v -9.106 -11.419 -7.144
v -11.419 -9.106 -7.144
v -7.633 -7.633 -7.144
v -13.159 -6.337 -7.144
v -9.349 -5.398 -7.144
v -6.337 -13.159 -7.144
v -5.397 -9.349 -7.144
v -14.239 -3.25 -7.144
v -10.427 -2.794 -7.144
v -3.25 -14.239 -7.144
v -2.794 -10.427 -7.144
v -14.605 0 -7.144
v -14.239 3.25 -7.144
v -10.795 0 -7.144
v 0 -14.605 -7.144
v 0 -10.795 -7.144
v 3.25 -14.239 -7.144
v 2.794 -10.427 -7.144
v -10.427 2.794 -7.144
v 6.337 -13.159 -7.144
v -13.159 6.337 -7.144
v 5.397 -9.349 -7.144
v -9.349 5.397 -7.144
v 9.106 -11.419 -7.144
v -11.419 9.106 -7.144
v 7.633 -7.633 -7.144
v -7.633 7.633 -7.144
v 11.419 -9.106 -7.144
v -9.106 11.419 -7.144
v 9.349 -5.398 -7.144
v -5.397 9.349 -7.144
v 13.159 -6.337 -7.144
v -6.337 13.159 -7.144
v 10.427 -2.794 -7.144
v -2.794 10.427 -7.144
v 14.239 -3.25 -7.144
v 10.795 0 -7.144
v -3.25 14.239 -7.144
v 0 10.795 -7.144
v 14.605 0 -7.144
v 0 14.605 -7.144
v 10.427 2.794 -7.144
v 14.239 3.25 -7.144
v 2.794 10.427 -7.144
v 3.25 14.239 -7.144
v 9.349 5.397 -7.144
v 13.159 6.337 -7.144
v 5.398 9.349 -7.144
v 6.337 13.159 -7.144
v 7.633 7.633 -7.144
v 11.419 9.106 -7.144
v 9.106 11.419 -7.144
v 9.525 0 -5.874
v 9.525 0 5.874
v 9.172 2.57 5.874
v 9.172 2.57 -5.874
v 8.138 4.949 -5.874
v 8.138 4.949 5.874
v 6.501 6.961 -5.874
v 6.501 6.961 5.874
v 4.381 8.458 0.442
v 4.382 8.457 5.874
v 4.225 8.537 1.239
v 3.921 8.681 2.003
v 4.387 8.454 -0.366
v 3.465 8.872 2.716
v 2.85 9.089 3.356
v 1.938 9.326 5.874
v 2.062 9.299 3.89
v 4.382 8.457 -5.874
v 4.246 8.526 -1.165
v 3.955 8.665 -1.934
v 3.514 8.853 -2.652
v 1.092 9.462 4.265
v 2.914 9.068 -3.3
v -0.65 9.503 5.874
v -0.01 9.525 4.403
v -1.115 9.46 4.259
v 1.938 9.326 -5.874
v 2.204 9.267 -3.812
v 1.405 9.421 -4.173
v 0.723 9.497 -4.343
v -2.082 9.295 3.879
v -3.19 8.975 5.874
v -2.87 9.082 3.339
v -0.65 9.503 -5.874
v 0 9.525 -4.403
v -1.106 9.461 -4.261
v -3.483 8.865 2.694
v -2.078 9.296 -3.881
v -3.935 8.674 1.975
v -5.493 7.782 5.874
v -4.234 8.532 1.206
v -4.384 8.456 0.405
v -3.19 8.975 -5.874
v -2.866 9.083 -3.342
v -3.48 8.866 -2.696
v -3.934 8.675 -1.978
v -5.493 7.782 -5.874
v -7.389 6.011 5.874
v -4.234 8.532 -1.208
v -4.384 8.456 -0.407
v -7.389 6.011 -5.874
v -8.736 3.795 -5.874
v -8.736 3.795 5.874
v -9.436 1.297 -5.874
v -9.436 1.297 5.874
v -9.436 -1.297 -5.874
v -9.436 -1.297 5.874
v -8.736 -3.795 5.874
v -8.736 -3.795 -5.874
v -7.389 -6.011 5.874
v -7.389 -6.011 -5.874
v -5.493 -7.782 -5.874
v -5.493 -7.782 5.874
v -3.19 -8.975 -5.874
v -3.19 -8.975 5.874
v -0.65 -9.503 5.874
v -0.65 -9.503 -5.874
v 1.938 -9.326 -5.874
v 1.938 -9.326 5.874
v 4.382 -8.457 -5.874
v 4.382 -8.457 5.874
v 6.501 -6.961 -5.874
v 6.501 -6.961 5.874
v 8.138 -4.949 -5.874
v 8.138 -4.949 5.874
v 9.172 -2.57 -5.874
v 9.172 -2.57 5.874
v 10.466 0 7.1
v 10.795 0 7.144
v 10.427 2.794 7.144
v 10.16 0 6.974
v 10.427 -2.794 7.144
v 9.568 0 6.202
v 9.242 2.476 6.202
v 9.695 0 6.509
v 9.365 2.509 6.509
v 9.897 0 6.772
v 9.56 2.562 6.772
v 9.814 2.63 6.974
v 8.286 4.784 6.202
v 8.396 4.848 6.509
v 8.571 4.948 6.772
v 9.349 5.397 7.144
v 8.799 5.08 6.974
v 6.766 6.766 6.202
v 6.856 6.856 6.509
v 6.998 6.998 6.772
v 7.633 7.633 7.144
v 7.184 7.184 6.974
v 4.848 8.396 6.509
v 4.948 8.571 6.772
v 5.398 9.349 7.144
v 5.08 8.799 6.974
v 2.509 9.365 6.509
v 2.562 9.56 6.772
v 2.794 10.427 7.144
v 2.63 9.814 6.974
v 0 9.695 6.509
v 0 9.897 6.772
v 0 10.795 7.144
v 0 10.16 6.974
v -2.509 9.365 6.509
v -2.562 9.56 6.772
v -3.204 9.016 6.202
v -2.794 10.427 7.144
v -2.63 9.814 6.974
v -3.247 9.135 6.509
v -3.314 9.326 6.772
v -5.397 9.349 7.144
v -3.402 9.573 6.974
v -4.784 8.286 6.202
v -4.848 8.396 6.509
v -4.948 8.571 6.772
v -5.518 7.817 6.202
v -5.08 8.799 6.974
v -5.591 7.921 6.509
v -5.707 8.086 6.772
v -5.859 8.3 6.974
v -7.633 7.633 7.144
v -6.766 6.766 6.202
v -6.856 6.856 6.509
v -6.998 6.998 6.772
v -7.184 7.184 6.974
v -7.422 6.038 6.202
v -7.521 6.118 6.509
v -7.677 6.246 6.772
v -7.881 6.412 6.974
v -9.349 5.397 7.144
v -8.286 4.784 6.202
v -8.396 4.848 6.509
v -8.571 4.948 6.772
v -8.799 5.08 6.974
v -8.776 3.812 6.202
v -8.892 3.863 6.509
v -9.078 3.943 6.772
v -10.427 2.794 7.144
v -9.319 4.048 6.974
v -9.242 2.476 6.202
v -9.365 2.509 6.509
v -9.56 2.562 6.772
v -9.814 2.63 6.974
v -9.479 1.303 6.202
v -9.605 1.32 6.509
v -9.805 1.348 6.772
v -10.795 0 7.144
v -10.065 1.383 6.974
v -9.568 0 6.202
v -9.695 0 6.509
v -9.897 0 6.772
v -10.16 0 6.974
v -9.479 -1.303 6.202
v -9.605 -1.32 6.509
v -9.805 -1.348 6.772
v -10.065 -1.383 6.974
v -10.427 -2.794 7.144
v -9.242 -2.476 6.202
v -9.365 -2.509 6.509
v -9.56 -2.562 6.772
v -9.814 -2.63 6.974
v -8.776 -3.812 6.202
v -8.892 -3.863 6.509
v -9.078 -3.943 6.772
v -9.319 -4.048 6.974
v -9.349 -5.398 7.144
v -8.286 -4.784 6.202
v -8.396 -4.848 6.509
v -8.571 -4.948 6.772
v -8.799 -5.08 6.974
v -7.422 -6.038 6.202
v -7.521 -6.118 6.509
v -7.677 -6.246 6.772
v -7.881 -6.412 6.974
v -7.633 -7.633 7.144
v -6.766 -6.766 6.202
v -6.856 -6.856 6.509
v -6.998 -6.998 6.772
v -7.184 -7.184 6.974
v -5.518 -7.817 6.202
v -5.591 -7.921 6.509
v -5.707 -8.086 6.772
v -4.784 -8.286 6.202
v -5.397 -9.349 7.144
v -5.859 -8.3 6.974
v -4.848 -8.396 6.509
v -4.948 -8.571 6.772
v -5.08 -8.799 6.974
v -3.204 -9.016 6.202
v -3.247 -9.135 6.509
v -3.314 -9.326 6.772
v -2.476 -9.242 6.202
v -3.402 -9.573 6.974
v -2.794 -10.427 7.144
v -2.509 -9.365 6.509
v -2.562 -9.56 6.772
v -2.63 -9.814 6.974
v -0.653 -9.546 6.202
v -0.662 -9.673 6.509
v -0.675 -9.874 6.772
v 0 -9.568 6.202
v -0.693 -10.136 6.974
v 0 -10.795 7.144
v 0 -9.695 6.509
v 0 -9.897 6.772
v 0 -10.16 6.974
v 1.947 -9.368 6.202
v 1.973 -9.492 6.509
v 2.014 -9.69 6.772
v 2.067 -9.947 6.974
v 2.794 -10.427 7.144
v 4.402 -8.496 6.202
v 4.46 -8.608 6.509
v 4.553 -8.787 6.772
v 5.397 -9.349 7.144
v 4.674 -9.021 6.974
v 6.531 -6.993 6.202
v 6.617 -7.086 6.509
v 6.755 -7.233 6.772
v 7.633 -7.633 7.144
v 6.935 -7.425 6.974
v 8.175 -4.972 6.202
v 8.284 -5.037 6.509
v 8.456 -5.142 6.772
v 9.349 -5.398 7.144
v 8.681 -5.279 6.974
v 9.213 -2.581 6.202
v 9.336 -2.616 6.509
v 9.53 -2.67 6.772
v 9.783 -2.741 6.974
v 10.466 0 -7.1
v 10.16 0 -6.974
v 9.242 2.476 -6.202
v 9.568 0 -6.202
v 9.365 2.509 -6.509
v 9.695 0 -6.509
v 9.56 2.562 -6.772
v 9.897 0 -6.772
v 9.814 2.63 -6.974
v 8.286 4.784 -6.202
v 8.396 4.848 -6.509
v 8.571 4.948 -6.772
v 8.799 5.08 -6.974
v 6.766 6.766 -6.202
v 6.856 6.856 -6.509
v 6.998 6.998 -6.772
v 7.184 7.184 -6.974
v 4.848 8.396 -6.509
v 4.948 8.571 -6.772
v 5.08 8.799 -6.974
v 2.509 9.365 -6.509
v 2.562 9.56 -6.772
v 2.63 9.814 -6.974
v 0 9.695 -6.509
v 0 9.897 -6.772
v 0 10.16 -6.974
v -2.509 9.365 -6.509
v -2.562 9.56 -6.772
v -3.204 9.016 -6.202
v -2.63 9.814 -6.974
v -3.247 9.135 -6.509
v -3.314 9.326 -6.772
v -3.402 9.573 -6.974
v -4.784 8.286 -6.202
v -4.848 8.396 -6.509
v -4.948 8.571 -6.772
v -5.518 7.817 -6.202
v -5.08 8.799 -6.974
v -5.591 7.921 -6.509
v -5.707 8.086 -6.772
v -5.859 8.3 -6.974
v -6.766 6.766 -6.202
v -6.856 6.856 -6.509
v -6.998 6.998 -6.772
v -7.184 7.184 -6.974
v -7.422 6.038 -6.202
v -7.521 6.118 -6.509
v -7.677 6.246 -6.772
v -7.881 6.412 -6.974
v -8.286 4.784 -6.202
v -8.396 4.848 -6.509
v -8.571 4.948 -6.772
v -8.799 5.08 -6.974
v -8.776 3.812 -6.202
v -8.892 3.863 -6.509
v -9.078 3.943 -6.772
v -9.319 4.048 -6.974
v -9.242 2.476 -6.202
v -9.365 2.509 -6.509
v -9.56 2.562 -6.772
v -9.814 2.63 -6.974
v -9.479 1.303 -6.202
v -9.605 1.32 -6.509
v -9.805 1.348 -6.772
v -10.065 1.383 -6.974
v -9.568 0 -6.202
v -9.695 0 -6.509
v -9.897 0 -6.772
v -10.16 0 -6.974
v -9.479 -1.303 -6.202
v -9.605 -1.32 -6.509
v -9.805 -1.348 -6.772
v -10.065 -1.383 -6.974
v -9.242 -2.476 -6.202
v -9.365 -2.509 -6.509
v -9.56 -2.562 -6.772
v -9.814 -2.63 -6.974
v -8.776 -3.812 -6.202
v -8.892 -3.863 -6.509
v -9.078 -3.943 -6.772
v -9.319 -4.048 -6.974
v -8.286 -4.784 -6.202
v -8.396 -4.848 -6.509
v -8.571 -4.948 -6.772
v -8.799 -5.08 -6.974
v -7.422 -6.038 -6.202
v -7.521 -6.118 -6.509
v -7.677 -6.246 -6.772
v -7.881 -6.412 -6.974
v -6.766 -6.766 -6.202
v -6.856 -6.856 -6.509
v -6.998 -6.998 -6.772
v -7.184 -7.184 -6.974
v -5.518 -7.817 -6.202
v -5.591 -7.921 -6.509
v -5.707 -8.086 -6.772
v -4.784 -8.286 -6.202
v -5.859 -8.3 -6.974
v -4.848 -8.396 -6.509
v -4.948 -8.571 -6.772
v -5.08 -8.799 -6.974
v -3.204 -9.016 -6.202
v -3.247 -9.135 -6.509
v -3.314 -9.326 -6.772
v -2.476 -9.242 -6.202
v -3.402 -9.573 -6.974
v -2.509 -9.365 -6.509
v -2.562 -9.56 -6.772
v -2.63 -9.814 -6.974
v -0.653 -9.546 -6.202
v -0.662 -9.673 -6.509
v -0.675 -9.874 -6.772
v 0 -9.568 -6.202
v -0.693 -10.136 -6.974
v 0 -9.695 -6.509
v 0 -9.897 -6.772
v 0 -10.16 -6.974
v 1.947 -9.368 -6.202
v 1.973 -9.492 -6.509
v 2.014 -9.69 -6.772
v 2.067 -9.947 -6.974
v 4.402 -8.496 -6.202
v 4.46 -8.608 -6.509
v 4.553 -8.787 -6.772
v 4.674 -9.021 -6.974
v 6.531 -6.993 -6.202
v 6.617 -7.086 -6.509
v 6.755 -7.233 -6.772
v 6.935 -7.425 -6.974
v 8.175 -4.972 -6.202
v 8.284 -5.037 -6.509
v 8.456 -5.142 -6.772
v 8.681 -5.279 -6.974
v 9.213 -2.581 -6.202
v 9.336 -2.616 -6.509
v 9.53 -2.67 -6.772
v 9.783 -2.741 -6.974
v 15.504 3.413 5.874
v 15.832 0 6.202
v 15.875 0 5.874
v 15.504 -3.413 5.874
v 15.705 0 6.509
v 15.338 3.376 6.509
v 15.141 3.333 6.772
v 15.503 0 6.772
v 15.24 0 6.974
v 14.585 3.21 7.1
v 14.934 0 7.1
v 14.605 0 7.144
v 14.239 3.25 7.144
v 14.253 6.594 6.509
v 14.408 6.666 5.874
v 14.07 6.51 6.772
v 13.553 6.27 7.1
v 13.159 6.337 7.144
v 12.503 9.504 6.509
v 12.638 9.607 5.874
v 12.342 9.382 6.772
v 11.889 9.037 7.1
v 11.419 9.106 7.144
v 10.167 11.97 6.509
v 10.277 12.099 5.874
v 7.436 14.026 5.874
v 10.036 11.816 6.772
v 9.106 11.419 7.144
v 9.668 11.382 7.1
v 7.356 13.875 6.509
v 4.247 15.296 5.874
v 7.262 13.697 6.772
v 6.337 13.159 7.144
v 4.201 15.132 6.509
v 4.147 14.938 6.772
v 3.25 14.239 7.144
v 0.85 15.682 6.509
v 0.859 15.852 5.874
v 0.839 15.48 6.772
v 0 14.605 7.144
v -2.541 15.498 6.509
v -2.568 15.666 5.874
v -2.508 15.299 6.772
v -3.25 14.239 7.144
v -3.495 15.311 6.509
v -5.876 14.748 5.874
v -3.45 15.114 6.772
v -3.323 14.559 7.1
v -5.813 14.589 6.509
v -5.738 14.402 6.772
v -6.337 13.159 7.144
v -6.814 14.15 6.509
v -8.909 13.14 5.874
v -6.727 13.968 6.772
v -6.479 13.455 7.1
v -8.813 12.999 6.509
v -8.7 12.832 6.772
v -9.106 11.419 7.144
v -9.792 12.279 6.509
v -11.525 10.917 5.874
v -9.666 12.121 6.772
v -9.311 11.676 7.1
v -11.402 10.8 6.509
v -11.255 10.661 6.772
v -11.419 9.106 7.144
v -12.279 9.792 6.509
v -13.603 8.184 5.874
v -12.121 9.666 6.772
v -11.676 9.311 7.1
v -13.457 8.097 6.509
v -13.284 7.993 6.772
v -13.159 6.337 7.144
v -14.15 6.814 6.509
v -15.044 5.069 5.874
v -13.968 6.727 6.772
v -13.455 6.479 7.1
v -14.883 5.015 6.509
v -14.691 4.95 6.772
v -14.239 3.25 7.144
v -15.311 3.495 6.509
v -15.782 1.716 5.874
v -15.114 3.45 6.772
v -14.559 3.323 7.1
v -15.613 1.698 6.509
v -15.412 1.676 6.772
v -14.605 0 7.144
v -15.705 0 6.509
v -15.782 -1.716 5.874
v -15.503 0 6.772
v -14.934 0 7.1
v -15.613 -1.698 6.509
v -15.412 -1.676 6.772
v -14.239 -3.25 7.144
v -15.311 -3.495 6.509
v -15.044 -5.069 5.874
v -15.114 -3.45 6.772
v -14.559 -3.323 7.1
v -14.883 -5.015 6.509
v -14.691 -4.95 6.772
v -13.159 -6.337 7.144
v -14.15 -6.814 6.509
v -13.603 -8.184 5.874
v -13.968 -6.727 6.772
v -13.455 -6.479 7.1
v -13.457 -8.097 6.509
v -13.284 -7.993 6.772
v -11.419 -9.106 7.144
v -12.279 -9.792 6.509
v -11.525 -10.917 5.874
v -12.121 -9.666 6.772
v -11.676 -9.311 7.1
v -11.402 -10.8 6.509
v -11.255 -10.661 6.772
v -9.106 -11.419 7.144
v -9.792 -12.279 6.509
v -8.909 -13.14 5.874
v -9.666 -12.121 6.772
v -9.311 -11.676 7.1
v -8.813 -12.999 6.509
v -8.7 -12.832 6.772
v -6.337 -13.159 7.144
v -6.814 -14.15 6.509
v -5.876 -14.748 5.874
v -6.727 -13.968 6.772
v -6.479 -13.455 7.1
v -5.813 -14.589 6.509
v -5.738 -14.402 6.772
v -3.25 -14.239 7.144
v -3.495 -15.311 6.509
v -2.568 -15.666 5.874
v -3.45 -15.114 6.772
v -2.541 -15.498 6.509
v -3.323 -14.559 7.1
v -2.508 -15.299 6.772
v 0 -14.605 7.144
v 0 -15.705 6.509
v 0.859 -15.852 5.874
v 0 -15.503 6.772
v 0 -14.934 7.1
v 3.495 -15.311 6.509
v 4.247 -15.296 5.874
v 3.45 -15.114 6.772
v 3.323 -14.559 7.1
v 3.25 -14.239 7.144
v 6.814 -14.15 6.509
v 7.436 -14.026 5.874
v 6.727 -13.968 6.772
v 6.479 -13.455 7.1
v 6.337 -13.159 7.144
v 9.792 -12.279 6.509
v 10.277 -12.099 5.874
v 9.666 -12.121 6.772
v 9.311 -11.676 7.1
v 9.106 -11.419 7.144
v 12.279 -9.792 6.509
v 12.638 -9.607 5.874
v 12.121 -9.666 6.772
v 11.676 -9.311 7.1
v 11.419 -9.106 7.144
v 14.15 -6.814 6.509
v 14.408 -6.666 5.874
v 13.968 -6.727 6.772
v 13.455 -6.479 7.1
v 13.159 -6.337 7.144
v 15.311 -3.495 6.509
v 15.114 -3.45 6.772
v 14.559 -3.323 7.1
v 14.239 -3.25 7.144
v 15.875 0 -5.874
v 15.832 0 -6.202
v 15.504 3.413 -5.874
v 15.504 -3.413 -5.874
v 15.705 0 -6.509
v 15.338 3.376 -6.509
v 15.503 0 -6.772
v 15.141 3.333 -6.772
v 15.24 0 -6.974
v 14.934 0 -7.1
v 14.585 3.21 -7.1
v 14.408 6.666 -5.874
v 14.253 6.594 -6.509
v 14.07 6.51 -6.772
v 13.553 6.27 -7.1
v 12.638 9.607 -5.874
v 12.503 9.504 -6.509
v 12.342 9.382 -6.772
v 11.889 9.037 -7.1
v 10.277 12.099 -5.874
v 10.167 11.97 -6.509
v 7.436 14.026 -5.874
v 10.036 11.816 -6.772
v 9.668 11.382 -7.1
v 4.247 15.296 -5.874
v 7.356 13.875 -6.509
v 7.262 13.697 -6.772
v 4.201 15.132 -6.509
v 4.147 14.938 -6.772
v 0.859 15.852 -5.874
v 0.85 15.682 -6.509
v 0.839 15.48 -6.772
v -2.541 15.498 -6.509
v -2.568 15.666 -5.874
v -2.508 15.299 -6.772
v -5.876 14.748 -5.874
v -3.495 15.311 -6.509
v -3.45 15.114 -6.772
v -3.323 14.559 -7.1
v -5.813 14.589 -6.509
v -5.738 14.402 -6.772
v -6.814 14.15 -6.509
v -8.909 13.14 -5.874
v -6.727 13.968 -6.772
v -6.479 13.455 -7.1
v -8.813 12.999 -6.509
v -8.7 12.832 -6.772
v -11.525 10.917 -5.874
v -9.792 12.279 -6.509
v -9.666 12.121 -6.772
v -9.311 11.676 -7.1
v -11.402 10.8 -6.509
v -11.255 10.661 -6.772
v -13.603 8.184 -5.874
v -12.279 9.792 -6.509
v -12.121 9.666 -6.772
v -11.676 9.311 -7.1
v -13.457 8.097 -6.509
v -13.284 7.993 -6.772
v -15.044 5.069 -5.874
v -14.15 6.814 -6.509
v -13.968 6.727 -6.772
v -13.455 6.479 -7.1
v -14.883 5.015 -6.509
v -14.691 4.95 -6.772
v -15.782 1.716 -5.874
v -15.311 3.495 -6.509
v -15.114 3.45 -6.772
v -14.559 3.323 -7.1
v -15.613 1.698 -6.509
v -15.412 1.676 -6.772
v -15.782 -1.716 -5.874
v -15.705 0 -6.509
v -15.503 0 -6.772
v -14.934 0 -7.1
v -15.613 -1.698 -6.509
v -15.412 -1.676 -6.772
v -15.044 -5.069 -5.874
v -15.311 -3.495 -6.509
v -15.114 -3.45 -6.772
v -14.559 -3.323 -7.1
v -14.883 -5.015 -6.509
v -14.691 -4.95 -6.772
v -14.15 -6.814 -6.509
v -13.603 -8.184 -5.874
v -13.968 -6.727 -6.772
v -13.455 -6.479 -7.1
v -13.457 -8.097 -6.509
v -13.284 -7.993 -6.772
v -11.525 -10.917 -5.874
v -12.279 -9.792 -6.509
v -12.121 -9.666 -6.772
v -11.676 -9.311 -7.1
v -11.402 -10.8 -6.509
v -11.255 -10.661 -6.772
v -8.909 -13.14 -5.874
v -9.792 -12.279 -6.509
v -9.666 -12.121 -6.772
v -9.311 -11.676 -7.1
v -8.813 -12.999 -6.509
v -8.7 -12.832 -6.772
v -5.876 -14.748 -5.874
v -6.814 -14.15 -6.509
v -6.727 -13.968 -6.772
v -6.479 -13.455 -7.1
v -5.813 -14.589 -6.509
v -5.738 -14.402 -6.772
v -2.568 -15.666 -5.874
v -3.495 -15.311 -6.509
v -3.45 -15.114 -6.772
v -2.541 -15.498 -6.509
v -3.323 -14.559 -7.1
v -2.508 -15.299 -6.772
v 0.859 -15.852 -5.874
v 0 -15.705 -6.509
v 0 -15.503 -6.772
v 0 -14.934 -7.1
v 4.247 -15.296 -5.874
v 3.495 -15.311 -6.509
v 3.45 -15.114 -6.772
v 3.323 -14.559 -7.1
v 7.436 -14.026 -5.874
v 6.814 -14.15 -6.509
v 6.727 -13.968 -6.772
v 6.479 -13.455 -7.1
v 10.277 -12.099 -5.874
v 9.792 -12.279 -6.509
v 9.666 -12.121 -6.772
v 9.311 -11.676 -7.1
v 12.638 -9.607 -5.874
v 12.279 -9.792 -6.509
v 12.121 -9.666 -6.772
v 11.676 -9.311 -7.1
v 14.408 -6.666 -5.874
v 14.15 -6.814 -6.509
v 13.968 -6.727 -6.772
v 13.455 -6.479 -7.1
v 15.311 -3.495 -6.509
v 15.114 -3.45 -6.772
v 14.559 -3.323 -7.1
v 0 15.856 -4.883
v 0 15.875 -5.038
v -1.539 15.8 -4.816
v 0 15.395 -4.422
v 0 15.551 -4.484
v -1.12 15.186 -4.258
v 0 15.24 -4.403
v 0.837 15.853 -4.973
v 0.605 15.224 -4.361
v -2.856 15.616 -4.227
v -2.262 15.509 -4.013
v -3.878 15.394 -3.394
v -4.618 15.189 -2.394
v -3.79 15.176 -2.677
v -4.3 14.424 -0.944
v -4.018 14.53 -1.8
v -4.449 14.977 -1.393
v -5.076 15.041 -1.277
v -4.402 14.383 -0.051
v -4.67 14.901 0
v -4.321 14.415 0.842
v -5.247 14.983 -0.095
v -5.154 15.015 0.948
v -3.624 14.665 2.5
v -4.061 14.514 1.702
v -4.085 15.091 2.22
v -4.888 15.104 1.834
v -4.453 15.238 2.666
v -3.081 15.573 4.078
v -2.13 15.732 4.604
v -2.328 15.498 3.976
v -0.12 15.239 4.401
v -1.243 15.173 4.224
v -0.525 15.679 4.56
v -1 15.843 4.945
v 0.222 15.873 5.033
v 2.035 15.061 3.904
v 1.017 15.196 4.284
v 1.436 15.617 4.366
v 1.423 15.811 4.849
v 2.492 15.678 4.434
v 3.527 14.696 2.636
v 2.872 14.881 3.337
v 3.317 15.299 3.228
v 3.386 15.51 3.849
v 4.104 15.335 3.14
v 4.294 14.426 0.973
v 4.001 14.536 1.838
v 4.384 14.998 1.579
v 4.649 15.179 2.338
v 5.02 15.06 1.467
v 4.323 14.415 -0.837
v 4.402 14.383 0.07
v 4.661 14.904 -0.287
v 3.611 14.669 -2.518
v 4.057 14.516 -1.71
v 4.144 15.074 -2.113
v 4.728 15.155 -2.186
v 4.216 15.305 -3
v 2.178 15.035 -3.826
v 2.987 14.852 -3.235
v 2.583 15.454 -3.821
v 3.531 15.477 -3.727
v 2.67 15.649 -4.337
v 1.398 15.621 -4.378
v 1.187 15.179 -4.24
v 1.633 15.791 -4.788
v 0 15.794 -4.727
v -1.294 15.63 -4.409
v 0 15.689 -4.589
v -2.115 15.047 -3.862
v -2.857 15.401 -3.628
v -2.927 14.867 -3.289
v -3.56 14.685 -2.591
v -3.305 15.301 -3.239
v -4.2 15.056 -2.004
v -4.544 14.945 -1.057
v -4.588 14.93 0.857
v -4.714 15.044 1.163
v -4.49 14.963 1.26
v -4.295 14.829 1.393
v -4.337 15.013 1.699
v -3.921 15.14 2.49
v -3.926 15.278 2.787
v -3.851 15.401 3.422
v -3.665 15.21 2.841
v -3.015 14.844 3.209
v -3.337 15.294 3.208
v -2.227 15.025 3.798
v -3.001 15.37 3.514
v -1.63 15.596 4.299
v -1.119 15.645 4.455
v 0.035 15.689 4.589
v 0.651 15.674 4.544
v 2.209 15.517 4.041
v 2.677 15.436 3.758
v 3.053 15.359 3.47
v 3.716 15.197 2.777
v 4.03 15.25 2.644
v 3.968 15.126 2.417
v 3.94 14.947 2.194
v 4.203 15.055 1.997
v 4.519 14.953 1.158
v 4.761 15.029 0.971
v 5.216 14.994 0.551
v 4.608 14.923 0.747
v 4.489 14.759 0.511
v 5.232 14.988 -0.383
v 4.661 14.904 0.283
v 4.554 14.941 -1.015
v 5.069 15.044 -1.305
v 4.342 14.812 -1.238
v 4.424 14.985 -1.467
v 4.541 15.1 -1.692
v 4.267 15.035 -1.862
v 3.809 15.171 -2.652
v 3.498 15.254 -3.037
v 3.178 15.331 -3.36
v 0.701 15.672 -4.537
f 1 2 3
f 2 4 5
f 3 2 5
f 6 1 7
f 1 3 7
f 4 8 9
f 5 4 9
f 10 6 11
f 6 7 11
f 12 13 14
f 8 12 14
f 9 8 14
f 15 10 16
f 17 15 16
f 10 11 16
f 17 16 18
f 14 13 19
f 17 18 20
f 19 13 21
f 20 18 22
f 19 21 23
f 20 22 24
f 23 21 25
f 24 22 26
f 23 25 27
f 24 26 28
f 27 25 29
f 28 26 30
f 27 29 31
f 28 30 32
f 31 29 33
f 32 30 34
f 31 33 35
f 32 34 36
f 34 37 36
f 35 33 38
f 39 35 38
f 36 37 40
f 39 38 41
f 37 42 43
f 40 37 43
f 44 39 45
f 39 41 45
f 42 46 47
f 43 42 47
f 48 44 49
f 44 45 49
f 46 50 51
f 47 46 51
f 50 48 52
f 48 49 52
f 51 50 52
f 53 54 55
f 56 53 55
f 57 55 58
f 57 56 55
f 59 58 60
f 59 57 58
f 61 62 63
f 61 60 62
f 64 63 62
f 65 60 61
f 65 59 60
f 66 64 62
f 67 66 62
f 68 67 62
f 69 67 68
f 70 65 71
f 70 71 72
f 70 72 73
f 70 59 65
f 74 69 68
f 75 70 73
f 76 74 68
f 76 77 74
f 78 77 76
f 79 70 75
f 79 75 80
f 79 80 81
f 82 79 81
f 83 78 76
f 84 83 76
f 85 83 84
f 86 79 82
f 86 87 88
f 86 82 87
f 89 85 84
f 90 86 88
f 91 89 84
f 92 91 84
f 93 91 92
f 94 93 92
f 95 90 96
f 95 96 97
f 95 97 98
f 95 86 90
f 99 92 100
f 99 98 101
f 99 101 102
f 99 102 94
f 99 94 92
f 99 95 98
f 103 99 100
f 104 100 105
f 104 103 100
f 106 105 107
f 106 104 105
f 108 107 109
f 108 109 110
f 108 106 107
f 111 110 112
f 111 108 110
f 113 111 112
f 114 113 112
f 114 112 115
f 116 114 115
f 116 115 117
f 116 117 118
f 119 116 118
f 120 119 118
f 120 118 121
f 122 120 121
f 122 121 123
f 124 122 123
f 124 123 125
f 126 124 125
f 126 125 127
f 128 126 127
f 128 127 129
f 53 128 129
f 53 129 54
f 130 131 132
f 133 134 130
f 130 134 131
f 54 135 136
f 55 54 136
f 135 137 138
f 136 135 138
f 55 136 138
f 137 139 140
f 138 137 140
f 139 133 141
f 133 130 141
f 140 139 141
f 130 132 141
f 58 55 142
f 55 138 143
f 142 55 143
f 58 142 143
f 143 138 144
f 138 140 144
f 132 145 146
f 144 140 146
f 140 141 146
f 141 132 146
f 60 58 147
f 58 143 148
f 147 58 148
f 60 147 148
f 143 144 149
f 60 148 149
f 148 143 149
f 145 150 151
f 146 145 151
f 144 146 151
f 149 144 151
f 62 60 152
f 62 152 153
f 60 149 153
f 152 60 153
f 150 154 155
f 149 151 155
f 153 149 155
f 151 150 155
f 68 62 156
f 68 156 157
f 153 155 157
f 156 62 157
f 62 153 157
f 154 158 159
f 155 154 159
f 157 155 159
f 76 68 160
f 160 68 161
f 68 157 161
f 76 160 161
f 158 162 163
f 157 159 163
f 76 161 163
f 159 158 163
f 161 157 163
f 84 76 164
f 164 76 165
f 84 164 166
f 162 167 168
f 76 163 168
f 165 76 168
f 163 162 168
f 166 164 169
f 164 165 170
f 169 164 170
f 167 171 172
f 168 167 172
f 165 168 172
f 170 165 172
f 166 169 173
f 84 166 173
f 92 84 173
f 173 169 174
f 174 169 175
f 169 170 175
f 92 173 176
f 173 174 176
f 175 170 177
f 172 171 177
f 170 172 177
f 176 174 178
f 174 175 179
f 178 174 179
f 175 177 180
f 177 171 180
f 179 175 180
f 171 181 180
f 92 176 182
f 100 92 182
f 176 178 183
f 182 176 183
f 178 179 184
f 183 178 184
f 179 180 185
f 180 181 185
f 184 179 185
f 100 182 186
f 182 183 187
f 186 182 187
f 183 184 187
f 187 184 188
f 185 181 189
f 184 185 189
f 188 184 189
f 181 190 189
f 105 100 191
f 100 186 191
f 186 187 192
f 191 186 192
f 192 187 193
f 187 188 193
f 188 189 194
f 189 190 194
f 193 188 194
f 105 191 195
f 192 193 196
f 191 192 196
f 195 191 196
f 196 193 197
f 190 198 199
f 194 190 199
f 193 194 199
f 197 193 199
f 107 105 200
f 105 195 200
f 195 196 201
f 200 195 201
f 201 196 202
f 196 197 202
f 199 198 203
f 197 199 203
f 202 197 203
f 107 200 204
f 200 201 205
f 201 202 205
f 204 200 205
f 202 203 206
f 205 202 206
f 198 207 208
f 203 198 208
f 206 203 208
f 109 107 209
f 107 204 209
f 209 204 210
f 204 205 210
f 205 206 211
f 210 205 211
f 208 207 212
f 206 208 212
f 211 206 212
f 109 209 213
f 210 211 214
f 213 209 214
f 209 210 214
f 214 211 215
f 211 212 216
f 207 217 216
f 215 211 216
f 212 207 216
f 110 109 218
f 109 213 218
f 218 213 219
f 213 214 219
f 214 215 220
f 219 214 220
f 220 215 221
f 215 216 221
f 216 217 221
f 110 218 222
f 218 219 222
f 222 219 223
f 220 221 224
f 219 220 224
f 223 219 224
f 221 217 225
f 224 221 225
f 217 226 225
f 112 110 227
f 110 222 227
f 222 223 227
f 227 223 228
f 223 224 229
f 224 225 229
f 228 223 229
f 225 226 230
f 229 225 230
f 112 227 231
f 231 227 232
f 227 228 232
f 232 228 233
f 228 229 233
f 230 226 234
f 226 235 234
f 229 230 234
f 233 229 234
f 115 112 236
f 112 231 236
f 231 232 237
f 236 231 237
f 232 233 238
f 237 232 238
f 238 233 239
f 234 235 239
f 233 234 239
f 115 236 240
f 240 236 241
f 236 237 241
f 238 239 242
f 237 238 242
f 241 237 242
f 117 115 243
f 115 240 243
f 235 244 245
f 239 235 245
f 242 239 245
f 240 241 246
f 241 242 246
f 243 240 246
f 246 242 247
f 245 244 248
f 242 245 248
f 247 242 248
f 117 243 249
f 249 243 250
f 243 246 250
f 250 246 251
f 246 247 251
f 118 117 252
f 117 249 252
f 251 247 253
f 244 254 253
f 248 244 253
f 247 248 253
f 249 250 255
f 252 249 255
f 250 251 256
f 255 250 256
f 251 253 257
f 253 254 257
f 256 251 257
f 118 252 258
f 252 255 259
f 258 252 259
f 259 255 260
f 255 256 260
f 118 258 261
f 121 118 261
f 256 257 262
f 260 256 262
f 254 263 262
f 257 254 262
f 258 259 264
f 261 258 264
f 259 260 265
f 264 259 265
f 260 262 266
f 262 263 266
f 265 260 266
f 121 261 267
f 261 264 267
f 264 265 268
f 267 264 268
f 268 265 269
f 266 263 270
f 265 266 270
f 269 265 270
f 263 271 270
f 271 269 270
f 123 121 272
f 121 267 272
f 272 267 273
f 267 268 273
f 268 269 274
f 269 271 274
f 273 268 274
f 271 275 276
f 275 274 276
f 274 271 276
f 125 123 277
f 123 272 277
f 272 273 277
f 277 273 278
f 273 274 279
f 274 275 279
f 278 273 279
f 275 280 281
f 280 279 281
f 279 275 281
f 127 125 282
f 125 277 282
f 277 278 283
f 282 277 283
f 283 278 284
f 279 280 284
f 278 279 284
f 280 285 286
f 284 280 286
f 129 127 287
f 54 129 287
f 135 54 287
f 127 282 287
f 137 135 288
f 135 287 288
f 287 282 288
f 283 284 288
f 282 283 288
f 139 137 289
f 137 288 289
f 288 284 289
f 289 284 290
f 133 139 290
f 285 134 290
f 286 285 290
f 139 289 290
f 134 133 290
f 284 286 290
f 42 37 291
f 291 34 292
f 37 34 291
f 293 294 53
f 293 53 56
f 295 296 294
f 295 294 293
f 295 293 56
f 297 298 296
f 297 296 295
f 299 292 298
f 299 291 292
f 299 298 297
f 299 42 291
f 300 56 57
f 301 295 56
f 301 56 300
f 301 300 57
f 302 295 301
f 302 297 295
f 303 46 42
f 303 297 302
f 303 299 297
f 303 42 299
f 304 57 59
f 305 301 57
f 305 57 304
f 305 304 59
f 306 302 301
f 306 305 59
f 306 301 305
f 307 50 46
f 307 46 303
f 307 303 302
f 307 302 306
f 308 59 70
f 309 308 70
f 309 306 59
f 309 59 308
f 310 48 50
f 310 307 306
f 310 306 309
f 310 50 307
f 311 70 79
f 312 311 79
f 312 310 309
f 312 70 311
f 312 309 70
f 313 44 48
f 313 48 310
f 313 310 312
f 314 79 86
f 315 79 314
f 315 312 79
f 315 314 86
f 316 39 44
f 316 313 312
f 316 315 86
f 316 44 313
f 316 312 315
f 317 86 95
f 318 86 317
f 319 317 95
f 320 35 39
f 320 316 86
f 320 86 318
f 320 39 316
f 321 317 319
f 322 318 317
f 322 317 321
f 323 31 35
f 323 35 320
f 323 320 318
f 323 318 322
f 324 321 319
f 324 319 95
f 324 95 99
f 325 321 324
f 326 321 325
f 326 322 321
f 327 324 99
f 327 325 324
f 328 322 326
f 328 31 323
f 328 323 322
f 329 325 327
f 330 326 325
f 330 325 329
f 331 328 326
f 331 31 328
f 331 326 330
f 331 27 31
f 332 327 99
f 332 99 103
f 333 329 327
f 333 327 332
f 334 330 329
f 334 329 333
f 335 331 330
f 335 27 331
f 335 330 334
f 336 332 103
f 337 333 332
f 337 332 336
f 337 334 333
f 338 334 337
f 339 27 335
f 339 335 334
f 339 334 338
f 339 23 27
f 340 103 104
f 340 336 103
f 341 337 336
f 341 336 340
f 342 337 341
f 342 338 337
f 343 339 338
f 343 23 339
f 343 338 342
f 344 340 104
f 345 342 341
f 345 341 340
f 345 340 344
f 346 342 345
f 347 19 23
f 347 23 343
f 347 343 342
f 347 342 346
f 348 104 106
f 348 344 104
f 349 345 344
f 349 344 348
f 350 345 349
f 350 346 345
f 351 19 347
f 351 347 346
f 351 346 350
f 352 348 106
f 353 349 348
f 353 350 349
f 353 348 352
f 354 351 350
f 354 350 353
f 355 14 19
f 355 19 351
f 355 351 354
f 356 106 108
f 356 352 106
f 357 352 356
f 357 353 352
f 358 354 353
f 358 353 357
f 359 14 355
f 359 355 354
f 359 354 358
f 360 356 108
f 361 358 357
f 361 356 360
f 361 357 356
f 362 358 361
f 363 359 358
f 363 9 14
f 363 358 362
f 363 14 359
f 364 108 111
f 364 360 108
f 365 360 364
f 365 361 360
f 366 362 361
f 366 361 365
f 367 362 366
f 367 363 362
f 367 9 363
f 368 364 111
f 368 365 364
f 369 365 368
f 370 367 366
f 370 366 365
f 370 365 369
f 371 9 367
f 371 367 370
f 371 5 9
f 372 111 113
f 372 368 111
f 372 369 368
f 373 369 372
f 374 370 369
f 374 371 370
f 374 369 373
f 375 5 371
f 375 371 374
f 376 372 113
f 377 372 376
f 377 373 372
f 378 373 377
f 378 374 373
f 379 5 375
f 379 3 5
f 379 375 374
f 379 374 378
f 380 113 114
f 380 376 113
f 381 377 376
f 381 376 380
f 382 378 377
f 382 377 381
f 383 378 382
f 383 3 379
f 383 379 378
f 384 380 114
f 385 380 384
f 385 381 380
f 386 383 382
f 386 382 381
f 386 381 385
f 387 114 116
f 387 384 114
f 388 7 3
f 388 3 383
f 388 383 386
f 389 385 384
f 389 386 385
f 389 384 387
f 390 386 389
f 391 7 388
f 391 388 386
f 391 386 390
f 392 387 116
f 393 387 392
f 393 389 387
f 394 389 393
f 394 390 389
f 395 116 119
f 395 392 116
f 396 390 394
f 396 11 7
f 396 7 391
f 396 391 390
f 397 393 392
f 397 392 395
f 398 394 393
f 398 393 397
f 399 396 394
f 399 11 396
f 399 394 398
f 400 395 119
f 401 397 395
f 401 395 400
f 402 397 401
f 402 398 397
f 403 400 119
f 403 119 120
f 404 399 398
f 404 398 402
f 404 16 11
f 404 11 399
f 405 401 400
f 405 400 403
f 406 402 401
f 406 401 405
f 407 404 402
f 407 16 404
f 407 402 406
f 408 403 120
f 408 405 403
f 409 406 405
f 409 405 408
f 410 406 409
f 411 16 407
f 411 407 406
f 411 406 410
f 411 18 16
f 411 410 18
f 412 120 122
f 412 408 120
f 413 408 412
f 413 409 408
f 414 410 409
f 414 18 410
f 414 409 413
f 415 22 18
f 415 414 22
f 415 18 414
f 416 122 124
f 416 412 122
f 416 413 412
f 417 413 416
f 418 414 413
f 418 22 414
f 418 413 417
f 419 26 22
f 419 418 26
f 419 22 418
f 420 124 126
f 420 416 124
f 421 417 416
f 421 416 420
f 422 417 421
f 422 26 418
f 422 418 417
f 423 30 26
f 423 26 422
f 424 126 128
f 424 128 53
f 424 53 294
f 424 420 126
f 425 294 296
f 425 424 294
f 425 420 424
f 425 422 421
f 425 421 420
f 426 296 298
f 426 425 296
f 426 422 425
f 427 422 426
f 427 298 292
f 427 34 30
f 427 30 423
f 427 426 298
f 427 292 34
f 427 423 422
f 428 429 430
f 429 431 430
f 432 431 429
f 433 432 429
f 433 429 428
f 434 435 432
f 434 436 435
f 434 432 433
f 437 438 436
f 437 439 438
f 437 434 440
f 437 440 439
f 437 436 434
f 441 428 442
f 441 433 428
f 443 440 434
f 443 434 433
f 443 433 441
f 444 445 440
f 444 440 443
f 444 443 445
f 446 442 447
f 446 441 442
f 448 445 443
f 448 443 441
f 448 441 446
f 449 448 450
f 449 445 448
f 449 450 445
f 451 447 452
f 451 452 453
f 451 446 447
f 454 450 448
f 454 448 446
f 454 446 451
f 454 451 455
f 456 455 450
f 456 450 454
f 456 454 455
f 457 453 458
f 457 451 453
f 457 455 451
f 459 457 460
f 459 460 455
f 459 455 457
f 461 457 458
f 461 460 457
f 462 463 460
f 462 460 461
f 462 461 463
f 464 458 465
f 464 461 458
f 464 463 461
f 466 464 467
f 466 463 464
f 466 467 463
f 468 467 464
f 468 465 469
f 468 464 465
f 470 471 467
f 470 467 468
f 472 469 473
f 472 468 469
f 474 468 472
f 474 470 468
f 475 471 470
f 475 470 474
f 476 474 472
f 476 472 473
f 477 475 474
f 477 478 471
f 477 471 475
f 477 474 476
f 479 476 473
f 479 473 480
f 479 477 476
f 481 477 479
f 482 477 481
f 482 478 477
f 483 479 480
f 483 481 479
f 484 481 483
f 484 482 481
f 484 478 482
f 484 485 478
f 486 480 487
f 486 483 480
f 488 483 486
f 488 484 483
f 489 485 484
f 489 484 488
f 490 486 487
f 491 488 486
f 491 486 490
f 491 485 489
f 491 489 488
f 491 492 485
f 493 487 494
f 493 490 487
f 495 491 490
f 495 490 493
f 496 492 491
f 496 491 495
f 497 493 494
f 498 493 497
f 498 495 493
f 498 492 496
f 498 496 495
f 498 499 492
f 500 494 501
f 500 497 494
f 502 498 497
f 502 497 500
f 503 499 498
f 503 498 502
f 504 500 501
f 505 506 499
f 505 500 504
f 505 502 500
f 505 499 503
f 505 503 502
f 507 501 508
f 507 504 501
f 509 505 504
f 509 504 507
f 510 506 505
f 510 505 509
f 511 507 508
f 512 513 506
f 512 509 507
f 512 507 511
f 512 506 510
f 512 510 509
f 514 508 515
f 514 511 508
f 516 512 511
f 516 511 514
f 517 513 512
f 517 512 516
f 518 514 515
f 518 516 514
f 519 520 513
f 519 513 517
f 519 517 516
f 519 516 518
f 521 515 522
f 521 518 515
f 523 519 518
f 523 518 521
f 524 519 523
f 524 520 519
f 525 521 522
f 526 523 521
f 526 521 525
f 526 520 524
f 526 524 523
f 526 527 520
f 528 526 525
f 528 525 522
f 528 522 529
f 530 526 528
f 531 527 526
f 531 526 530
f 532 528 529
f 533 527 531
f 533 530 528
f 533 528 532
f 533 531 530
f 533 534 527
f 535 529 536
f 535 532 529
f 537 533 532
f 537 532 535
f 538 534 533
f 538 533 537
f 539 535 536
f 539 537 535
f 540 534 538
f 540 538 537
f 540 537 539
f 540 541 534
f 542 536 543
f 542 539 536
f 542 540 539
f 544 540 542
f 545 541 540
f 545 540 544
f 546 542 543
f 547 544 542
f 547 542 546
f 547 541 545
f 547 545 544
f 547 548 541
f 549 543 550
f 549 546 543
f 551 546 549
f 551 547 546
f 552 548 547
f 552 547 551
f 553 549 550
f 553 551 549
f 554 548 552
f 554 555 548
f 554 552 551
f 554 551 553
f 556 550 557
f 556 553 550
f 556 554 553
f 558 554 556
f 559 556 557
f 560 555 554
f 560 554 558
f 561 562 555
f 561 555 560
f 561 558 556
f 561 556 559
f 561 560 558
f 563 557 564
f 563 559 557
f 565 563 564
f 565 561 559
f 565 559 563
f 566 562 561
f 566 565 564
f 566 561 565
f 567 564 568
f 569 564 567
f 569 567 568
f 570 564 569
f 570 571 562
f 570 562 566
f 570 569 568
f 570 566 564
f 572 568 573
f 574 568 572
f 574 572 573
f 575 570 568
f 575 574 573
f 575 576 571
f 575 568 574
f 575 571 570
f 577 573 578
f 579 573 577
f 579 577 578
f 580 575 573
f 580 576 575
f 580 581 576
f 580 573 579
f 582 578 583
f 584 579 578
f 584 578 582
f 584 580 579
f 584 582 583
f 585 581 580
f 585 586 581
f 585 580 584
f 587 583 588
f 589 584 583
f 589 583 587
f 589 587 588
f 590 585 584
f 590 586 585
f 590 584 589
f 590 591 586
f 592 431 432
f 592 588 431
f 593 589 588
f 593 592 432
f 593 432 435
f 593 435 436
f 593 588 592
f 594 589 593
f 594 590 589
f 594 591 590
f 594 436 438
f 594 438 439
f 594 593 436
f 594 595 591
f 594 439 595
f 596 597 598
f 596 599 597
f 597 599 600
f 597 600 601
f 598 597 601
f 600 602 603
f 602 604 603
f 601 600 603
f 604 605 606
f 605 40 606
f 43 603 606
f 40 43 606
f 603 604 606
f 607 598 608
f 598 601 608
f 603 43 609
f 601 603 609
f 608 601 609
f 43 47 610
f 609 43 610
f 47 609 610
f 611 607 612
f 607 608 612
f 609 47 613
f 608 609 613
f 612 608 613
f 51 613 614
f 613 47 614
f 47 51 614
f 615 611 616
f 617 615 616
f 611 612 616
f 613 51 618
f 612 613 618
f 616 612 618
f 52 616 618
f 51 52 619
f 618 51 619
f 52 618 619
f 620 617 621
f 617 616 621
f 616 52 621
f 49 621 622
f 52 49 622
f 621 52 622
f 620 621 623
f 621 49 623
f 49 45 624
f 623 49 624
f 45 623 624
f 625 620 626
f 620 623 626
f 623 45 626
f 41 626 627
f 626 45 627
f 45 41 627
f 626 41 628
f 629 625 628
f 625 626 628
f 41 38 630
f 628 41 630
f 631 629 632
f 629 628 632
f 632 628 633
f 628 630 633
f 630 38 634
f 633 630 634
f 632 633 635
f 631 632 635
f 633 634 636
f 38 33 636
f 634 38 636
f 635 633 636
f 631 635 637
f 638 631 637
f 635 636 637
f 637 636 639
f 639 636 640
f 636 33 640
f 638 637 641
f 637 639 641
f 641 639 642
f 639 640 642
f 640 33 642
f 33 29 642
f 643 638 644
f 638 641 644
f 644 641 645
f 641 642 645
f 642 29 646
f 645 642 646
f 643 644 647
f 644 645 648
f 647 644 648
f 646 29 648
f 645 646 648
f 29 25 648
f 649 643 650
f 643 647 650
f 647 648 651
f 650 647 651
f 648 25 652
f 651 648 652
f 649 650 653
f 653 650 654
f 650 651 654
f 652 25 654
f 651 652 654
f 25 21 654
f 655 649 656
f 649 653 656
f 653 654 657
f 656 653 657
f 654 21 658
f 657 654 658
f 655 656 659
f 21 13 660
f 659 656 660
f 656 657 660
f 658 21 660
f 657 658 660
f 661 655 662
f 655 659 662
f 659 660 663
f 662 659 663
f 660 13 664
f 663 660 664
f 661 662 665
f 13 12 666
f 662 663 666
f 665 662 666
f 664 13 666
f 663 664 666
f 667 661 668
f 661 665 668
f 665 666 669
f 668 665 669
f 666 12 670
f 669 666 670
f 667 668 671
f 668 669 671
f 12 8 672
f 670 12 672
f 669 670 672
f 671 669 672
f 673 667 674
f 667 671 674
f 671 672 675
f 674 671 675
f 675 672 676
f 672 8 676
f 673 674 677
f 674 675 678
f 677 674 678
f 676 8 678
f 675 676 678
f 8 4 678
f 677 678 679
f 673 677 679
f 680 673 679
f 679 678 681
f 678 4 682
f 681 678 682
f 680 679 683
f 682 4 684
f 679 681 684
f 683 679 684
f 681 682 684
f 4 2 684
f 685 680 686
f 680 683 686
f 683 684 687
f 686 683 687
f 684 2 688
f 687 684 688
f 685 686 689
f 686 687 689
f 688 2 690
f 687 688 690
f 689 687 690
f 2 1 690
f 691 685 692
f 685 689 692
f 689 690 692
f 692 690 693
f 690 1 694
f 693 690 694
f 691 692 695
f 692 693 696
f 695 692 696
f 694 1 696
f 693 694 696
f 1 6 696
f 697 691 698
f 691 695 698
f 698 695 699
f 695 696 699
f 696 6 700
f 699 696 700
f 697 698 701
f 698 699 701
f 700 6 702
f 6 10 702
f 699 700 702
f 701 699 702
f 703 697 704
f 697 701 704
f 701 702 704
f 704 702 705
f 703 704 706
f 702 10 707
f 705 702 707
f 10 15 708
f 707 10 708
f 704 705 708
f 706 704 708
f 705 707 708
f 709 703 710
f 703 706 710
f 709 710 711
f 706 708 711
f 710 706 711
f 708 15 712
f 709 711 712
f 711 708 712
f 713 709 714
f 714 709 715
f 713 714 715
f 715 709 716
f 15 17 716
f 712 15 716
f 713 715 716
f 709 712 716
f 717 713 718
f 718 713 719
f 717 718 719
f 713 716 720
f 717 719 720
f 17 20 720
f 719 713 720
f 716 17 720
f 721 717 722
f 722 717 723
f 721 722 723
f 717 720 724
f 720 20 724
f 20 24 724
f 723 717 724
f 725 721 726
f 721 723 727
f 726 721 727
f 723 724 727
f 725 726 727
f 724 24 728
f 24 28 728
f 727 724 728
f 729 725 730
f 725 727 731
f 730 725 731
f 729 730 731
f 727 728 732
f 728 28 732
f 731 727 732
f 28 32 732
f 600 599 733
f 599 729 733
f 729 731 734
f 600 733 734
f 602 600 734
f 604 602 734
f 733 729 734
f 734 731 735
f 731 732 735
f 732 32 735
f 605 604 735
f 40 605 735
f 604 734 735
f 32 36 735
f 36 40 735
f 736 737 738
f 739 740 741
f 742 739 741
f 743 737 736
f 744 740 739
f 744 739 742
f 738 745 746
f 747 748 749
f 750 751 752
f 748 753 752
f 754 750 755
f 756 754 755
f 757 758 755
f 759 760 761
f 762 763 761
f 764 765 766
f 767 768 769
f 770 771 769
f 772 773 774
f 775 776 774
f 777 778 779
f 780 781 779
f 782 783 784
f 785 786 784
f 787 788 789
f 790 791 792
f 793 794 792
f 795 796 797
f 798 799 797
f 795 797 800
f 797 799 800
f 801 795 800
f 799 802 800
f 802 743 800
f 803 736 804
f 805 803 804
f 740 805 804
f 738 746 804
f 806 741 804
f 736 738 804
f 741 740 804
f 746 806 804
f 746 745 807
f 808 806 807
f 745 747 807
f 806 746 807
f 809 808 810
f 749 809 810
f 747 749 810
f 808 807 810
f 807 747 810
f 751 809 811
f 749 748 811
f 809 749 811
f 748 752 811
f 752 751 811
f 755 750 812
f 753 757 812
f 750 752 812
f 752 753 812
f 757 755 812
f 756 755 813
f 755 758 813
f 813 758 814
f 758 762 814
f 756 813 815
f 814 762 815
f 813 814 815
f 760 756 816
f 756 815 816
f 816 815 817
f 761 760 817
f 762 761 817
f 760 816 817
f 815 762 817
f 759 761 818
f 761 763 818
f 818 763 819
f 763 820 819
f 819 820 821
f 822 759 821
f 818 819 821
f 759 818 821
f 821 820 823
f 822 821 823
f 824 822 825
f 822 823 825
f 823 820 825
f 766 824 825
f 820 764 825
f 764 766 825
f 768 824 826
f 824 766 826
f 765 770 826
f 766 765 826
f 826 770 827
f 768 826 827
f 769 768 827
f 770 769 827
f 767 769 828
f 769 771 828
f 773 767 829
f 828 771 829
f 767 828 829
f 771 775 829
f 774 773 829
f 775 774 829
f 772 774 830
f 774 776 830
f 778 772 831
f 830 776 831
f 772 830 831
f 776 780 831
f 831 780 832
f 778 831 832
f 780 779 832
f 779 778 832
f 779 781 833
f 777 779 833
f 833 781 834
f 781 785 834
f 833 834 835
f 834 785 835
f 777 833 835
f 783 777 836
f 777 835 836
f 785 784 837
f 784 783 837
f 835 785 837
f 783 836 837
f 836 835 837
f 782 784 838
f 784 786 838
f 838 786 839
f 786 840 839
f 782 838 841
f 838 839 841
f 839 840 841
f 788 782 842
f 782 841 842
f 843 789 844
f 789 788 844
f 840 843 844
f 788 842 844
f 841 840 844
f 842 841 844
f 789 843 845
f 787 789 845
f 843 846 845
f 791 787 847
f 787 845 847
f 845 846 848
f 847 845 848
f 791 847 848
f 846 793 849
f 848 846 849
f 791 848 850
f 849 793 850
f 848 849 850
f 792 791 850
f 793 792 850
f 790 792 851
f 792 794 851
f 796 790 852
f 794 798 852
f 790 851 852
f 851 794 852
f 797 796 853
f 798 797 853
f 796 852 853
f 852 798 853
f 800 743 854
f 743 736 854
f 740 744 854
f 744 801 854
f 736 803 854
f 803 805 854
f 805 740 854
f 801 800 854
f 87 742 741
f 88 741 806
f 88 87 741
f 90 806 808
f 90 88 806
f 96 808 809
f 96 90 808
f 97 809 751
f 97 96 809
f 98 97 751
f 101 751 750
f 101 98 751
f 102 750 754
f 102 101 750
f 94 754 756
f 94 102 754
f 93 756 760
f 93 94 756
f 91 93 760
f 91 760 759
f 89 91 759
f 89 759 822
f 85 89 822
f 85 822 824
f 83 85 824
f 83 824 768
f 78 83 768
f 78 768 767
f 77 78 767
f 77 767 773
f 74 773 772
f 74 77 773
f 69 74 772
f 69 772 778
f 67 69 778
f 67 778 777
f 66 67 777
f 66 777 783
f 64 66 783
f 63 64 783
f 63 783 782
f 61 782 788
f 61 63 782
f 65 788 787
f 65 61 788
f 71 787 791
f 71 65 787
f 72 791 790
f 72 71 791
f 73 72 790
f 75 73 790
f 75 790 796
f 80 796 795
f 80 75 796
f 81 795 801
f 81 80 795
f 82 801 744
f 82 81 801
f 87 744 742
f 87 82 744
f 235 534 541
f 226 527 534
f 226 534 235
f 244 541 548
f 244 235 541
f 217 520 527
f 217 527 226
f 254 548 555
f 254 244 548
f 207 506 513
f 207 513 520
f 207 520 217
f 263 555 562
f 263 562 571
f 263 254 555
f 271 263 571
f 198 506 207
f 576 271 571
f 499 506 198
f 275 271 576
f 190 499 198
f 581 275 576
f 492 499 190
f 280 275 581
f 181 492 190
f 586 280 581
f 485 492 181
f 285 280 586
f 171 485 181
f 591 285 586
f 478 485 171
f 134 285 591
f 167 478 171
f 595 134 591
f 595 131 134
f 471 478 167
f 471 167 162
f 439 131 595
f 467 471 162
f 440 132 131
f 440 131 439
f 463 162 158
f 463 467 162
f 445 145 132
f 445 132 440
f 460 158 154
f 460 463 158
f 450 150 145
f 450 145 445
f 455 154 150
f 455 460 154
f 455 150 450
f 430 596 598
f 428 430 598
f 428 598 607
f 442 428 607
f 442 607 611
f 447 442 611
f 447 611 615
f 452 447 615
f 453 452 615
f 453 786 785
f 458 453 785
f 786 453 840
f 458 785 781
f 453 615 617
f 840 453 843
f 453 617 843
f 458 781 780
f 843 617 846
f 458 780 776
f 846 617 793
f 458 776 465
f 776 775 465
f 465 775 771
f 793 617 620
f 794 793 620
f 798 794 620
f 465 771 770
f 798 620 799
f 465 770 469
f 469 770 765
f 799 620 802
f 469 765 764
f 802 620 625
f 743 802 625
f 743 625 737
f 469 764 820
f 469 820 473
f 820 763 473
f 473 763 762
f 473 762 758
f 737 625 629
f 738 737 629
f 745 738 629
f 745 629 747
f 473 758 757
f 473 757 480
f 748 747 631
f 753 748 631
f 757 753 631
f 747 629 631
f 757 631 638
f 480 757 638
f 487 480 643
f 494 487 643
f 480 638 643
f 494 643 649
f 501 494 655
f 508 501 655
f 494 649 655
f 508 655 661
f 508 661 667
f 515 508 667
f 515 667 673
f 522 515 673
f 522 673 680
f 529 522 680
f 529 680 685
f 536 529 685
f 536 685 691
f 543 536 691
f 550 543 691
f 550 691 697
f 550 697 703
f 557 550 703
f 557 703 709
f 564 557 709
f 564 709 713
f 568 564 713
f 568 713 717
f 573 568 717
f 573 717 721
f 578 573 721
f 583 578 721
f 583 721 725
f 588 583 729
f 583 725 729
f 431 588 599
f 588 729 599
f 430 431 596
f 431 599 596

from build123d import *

# Parameters (mm, degrees)
BOSS_EXTRUDE1_DEPTH      = 7.14375
BOSS_EXTRUDE1_DEPTH_BACK = 7.14375
SKETCH1_R                = 15.875
SKETCH1_R_2              = 9.525
FILLET1_R                = 1.27
SKETCH3_R                = 4.402753613
CUT_EXTRUDE1_DEPTH       = 24.559805119
FILLET2_R                = 0.635


with BuildPart() as part:
    # Sketch1 → Boss-Extrude1 (new, two sides: drawn at the far end of the back side and taken through both)
    with BuildSketch(Plane.XY.offset(-BOSS_EXTRUDE1_DEPTH_BACK)):
        Circle(SKETCH1_R)
        Circle(SKETCH1_R_2, mode=Mode.SUBTRACT)
    extrude(amount=BOSS_EXTRUDE1_DEPTH + BOSS_EXTRUDE1_DEPTH_BACK)

    # Fillet1
    fillet1_edges = [part.edges().sort_by_distance(p)[0] for p in [
        (-15.875, 0, -7.14375),
        (-9.525, 0, -7.14375),
        (-15.875, 0, 7.14375),
        (-9.525, 0, 7.14375),
    ]]
    fillet(fillet1_edges, radius=FILLET1_R)

    # Sketch3 → Cut-Extrude1 (cut, through all)
    with BuildSketch(Plane(origin=(0, 0, 0), x_dir=(1, 0, 0), z_dir=(0, 1, 0))):
        Circle(SKETCH3_R)
    extrude(amount=CUT_EXTRUDE1_DEPTH, mode=Mode.SUBTRACT)

    # Fillet2
    fillet2_edges = [part.edges().sort_by_distance(p)[0] for p in [
        (0, 15.875, 4.402753613),
    ]]
    fillet(fillet2_edges, radius=FILLET2_R)


solid = part.part
